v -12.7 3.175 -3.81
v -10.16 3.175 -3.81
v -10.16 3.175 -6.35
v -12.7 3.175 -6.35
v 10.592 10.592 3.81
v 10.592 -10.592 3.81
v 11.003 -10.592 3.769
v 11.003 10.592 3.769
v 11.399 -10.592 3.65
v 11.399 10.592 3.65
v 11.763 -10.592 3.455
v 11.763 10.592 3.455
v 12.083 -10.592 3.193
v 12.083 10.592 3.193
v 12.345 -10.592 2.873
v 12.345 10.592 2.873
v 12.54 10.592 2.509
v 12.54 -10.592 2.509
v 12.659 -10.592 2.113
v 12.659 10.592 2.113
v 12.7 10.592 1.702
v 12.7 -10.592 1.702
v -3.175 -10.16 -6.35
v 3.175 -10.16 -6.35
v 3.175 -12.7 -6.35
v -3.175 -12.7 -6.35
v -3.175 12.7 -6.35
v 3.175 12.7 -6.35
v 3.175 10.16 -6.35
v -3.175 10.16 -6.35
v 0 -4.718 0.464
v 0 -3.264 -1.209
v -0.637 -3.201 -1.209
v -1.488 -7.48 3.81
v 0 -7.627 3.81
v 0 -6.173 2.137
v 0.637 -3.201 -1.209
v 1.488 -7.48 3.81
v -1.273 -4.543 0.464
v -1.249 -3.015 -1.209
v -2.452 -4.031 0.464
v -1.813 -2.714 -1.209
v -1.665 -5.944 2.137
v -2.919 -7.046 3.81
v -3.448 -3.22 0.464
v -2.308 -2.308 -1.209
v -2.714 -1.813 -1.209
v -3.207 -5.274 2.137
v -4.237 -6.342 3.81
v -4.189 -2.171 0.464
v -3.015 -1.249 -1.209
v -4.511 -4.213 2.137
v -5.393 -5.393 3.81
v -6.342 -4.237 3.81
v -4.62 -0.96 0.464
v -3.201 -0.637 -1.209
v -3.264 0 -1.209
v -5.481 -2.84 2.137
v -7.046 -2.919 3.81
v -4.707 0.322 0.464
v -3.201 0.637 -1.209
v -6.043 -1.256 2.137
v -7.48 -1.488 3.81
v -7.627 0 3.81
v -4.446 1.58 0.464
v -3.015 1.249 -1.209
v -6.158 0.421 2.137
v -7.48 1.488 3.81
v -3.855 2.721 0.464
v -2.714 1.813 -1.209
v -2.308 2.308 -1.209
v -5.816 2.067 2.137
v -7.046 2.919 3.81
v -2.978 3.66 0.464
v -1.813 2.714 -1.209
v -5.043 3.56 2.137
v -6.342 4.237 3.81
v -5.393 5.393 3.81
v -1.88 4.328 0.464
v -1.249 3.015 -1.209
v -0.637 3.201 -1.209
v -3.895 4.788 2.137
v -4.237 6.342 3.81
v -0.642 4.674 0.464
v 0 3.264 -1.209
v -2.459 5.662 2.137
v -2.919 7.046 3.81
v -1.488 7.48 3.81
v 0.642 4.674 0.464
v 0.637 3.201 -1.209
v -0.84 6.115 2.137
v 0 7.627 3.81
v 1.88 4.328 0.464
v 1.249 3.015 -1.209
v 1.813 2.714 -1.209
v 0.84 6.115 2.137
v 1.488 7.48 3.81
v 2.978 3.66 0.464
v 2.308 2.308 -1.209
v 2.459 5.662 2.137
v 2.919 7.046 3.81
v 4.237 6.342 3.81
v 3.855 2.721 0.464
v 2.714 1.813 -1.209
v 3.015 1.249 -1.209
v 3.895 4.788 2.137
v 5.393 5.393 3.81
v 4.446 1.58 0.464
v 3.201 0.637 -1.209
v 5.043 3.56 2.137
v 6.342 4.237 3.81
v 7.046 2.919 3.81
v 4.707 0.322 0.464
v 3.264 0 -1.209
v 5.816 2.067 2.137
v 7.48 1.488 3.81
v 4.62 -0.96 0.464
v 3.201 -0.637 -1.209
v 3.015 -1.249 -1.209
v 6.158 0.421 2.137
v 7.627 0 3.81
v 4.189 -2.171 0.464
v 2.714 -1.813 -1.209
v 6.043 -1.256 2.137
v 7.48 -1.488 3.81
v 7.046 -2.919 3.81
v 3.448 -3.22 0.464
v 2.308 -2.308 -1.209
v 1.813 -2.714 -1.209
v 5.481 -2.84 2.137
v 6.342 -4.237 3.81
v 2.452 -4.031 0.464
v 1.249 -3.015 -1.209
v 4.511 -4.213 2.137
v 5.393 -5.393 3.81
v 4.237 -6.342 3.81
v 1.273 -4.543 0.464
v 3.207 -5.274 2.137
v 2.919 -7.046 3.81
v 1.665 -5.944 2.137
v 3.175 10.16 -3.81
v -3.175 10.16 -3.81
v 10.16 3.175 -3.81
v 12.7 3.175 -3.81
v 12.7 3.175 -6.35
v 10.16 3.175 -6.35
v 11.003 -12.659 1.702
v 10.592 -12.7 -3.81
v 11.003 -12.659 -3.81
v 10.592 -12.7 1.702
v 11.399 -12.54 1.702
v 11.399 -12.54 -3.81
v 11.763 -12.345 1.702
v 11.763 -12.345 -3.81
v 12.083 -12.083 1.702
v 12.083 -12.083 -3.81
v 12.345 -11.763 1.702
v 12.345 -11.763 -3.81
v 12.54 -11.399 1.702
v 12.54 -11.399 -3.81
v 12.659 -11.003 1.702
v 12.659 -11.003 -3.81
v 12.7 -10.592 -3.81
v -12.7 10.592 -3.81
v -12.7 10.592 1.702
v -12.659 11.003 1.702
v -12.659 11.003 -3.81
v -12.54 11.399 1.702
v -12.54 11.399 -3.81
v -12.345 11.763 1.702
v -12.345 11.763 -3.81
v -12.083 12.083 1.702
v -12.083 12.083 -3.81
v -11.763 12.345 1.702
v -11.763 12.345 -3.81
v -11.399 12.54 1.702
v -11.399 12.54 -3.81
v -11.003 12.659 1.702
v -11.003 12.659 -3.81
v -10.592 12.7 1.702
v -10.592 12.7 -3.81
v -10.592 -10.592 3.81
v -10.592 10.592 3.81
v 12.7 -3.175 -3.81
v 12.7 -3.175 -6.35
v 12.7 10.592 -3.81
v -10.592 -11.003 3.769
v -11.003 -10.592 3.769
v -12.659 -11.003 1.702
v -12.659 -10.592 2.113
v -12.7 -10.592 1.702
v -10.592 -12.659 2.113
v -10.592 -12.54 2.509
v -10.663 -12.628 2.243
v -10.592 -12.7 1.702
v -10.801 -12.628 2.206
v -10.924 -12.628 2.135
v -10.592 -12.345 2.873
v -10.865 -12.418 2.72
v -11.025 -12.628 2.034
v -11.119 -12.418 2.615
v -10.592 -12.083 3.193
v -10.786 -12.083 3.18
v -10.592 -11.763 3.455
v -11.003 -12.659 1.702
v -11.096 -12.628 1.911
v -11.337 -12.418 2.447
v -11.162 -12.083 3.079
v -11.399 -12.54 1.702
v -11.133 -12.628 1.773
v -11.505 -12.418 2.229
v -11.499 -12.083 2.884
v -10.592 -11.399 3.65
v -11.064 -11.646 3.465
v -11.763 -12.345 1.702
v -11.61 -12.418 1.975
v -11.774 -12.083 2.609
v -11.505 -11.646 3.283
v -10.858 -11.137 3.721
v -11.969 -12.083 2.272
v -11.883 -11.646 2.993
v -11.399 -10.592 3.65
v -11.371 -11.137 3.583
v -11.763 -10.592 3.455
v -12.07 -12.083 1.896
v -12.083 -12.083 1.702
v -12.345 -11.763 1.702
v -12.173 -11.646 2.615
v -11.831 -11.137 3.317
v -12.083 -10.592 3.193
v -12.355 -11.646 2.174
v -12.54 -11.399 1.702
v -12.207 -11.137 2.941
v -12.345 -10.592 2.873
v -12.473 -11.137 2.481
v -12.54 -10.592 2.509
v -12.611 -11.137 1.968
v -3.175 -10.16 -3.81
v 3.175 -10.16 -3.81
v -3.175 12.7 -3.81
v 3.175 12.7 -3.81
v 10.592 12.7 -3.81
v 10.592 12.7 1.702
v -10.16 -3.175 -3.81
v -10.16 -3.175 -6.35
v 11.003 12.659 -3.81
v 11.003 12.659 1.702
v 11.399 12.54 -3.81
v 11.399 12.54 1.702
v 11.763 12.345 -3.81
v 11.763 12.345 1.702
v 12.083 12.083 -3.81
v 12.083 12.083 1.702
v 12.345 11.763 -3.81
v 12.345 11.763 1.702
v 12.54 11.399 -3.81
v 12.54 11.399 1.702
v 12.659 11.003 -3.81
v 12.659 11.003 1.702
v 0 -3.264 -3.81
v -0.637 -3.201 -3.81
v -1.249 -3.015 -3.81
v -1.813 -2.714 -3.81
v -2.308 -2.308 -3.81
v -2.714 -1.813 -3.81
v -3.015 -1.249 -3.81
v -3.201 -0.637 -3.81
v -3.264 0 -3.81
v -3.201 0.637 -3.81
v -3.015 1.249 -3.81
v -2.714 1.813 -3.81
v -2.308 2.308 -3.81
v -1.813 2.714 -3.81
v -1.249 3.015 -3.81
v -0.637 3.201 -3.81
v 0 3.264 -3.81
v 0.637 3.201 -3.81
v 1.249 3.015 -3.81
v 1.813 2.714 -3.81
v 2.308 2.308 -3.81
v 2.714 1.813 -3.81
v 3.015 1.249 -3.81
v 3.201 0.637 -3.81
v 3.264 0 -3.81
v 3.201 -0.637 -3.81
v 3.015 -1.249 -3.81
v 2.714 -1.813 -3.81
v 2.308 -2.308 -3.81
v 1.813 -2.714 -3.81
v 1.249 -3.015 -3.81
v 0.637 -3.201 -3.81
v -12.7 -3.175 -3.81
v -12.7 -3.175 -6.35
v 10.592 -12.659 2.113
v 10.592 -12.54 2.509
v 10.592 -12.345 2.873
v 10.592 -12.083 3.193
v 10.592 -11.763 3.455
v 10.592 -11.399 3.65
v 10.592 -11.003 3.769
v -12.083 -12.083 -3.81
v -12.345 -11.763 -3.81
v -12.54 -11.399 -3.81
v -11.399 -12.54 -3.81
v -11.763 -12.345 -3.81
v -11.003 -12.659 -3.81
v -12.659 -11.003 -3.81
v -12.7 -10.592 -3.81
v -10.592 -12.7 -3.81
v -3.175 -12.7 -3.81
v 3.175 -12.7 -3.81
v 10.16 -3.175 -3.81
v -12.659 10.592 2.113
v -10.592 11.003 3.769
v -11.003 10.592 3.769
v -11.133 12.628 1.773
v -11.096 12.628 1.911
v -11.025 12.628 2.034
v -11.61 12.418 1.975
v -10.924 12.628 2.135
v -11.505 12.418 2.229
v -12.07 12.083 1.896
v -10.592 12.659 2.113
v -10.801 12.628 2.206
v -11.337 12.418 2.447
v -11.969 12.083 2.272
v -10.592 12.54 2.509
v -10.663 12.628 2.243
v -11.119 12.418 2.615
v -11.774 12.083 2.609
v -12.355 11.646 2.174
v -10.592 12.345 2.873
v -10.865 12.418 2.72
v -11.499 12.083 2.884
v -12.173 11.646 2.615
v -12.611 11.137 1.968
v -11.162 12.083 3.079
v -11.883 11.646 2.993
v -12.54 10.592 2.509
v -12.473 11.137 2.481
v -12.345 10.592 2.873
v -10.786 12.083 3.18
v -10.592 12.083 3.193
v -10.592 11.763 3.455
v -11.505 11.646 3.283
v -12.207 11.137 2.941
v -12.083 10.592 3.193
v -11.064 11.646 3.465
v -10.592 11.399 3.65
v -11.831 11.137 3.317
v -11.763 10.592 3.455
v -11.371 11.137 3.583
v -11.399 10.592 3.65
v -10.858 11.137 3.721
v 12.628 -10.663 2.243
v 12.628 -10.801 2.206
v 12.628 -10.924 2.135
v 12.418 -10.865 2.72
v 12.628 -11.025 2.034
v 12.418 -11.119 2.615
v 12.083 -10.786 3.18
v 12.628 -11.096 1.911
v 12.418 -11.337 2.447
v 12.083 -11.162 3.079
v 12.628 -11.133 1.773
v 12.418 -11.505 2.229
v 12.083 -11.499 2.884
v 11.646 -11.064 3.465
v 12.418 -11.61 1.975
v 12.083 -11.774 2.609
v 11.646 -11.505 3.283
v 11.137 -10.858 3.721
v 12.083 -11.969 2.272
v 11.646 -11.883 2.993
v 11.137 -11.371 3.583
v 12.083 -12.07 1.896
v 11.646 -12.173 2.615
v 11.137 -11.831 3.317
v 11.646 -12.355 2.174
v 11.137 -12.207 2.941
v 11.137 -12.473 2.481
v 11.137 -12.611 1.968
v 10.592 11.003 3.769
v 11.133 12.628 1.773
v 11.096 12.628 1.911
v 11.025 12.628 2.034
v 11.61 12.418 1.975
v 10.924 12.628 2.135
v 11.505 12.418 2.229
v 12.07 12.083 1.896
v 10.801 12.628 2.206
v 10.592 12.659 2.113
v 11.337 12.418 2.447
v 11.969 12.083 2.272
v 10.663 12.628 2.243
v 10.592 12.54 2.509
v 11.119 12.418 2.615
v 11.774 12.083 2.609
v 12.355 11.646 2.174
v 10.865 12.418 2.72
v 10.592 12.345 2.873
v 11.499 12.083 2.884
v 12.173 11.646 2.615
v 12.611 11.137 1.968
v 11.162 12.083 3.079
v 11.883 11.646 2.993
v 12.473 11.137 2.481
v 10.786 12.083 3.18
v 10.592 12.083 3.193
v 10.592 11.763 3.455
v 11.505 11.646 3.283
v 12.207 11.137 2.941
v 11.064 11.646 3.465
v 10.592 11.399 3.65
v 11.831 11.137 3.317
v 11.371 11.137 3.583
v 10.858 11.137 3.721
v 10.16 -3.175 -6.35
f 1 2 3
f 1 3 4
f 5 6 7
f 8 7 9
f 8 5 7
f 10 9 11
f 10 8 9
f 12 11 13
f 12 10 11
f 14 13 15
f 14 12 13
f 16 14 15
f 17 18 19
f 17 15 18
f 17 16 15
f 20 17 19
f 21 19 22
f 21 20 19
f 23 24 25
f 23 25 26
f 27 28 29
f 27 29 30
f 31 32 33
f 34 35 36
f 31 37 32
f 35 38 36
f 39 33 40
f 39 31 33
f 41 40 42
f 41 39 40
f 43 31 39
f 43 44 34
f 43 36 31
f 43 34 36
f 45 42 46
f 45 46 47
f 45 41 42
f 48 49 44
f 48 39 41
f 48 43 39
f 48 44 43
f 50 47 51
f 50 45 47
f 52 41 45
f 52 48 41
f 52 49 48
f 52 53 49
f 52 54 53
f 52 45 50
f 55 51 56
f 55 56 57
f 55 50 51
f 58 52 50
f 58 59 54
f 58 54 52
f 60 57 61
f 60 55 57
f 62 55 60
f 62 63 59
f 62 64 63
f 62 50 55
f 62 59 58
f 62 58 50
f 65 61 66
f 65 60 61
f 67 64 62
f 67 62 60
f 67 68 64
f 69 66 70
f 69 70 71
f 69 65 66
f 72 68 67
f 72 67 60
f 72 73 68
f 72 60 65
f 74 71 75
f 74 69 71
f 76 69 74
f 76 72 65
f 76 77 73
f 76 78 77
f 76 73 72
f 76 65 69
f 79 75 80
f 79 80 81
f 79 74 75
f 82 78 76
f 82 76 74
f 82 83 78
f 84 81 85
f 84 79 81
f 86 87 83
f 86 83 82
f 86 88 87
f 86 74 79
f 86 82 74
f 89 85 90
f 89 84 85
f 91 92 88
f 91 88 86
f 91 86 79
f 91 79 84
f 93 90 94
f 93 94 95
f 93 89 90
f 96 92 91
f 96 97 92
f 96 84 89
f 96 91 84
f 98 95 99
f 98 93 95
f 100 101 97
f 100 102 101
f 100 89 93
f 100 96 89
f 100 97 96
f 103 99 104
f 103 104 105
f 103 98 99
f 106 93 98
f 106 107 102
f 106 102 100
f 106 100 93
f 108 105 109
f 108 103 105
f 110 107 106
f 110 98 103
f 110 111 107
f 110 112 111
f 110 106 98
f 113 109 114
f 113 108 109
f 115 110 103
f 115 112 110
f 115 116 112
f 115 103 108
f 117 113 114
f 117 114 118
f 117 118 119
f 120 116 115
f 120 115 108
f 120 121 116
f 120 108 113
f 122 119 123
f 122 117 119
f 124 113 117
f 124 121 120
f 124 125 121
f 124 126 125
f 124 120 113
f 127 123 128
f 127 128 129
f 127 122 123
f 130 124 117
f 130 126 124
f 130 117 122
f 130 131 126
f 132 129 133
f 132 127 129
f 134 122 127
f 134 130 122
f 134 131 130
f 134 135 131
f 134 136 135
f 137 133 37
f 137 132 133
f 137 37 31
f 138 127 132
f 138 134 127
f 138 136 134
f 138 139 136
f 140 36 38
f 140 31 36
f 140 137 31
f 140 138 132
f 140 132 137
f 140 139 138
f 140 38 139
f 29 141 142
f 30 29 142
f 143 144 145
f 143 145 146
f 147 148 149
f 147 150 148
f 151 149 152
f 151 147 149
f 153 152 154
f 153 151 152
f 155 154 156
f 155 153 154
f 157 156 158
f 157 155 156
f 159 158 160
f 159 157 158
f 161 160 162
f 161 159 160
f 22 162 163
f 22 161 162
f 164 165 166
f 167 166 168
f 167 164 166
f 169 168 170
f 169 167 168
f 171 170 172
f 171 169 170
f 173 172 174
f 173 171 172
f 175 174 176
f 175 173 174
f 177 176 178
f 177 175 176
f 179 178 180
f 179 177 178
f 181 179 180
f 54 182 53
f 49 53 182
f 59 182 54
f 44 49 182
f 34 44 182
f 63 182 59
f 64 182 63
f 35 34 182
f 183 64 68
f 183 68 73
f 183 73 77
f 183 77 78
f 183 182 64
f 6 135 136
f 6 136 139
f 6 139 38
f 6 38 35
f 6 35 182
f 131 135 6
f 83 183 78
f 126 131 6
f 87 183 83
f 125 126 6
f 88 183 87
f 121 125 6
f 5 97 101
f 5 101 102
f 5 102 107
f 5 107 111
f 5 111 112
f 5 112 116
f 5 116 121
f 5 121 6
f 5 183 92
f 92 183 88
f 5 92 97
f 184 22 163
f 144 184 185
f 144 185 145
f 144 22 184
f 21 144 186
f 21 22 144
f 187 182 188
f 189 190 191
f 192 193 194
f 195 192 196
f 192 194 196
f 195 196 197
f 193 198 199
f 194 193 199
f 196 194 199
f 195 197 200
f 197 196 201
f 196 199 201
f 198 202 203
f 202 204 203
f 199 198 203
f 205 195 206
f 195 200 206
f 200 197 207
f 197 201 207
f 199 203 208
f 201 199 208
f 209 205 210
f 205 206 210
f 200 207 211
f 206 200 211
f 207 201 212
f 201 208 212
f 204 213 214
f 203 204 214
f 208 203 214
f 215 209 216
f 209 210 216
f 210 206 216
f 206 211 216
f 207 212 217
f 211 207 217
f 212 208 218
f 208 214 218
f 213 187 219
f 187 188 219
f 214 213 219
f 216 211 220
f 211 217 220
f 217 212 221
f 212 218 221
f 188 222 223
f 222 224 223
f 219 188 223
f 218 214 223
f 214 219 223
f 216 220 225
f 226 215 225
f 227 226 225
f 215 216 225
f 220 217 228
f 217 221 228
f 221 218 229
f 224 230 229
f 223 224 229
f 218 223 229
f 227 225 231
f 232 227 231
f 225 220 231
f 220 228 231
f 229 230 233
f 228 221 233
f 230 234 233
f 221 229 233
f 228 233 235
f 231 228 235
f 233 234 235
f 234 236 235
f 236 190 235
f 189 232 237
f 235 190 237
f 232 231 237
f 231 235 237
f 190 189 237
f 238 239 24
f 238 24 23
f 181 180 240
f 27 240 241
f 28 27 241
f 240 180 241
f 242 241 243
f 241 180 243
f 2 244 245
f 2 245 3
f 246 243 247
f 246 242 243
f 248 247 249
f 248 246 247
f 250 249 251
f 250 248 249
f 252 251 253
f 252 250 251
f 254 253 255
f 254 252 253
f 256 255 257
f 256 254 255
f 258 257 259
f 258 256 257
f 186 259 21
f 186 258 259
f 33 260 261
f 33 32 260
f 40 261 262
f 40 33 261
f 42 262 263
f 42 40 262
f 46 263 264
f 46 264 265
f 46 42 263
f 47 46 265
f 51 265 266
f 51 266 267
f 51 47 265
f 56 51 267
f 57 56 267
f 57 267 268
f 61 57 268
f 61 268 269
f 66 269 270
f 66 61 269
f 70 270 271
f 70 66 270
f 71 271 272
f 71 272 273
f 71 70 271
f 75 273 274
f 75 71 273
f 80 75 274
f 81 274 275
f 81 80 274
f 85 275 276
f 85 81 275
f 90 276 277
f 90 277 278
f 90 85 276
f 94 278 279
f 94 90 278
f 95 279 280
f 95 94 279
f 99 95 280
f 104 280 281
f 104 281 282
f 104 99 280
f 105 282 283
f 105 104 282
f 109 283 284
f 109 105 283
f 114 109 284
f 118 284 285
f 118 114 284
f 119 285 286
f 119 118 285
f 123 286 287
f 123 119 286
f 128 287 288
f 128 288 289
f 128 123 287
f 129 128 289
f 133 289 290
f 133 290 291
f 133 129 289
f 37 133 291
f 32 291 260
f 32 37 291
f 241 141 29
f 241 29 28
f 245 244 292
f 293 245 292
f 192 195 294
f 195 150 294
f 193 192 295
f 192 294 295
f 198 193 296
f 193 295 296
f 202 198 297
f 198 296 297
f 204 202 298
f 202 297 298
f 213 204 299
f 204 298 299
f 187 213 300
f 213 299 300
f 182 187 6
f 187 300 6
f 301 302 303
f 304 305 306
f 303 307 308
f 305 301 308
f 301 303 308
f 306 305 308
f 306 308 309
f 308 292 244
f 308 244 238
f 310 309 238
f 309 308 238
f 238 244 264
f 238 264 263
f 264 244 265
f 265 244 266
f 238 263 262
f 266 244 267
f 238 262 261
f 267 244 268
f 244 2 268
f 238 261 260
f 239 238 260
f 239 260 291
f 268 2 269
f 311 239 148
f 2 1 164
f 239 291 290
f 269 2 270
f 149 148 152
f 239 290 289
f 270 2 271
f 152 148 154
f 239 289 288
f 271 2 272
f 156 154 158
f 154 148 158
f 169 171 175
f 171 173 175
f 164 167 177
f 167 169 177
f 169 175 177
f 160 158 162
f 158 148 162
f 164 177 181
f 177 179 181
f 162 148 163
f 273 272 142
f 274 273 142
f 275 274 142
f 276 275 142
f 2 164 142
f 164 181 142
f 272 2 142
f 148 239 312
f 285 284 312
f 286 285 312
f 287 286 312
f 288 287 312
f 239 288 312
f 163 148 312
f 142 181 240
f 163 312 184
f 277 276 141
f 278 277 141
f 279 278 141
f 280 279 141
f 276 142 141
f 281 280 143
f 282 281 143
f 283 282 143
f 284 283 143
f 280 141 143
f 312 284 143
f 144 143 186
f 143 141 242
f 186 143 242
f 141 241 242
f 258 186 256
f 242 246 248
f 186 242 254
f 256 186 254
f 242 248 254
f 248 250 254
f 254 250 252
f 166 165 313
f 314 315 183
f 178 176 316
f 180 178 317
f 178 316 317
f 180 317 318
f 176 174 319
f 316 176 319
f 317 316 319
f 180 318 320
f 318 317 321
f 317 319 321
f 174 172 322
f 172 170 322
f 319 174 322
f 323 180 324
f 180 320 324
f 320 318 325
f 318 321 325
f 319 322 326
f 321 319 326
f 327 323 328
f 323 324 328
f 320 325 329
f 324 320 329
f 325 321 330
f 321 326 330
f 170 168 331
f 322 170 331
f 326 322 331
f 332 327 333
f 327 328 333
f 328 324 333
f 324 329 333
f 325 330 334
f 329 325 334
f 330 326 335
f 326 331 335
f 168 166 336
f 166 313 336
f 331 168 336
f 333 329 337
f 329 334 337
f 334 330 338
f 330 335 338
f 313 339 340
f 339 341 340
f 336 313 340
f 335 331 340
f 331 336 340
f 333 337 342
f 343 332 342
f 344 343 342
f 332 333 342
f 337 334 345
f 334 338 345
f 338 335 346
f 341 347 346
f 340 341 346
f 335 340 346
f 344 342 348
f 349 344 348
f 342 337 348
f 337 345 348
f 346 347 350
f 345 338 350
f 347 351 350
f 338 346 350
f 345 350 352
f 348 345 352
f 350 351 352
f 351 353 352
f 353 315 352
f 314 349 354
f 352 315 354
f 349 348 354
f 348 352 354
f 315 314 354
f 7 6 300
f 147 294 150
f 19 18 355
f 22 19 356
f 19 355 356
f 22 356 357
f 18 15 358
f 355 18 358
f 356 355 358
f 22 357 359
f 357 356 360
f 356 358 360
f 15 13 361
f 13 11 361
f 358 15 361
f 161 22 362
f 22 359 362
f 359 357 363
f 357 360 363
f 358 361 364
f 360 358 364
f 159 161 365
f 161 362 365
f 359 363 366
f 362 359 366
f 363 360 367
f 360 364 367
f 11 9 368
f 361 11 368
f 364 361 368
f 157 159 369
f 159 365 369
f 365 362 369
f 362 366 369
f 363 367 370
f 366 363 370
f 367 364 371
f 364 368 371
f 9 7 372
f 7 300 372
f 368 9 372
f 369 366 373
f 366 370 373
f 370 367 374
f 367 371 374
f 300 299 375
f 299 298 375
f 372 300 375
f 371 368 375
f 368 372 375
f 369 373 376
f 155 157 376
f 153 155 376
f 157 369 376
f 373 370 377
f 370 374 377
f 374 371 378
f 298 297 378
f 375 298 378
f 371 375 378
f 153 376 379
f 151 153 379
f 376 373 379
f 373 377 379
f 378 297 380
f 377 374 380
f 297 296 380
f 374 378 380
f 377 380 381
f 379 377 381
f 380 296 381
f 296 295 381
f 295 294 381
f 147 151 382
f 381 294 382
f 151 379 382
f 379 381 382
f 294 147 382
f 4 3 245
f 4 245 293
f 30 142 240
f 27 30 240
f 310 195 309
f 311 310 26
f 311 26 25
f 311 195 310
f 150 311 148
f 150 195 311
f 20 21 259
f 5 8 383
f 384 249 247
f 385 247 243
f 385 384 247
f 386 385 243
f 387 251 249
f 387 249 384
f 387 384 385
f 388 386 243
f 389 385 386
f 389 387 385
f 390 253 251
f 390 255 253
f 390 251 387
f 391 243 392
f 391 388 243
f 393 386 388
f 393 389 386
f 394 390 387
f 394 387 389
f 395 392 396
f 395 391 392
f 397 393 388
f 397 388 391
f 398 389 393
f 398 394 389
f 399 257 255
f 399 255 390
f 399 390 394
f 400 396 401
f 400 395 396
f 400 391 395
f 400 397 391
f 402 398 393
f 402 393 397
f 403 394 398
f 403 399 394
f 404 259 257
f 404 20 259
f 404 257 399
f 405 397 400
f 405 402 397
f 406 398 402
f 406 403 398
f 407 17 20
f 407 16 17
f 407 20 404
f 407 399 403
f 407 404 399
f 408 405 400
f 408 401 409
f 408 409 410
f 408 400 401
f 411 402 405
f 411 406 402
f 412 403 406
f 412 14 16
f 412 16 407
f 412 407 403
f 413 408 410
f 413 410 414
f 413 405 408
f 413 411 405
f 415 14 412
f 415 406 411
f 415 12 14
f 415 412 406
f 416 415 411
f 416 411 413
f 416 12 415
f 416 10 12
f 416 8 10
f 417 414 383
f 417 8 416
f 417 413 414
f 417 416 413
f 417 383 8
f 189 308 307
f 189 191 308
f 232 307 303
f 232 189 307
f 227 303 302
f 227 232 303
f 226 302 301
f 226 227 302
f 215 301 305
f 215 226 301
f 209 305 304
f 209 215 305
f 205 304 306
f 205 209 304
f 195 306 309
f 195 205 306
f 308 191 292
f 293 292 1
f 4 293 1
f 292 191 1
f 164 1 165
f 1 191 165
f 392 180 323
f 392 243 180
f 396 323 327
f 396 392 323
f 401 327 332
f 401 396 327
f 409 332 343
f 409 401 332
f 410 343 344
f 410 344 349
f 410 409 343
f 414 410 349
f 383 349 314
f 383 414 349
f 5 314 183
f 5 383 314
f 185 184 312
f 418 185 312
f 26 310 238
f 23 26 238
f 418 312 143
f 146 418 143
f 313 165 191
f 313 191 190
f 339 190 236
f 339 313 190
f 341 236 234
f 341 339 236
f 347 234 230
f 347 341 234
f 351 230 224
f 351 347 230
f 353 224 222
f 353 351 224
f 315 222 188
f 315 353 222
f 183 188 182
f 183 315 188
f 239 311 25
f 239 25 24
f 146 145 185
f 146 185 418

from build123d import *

# Parameters (mm, degrees)
SKETCH1_W           = 25.4
SKETCH1_H           = 25.4
BOSS_EXTRUDE1_DEPTH = 3.81
FILLET1_R           = 2.1082
SKETCH4_W           = 6.35
SKETCH4_H           = 2.54
SKETCH4_W_2         = 2.54
SKETCH4_H_2         = 6.35
BOSS_EXTRUDE2_DEPTH = 2.54


with BuildPart() as part:
    # Sketch1 → Boss-Extrude1 (new body, symmetric)
    with BuildSketch(Plane.XY):
        Rectangle(SKETCH1_W, SKETCH1_H)
    extrude(amount=BOSS_EXTRUDE1_DEPTH, both=True)

    # Sketch3 → CSK for 1/4 Flat Head Socket Cap Screw1 (revolve, cut)
    with BuildSketch(Plane(origin=(0, 0, 3.81), x_dir=(0, -1, 0), z_dir=(1, 0, 0))):
        Polygon((0, 0), (0, 7.62), (3.2639, 7.62), (3.2639, 5.019052874), (7.6268961, 0), align=None)
    revolve(axis=Axis((0, 0, 10.16), (0, 0, -1)), mode=Mode.SUBTRACT)

    # Fillet1
    fillet1_edges = [part.edges().sort_by_distance(p)[0] for p in [
        (-12.7, 0, 3.81),
        (0, -12.7, 3.81),
        (12.7, 0, 3.81),
        (12.7, -12.7, 0),
        (-12.7, -12.7, 0),
        (-12.7, 12.7, 0),
        (12.7, 12.7, 0),
        (0, 12.7, 3.81),
    ]]
    fillet(fillet1_edges, radius=FILLET1_R)

    # Sketch4 → Boss-Extrude2 (add)
    with BuildSketch(Plane(origin=(0, 0, -3.81), x_dir=(-1, 0, 0), z_dir=(0, 0, -1))):
        with Locations((0, 11.43)):
            Rectangle(SKETCH4_W, SKETCH4_H)
        with Locations((-11.43, 0)):
            Rectangle(SKETCH4_W_2, SKETCH4_H_2)
        with Locations((11.43, 0)):
            Rectangle(SKETCH4_W_2, SKETCH4_H_2)
        with Locations((0, -11.43)):
            Rectangle(SKETCH4_W, SKETCH4_H)
    extrude(amount=BOSS_EXTRUDE2_DEPTH)


solid = part.part
